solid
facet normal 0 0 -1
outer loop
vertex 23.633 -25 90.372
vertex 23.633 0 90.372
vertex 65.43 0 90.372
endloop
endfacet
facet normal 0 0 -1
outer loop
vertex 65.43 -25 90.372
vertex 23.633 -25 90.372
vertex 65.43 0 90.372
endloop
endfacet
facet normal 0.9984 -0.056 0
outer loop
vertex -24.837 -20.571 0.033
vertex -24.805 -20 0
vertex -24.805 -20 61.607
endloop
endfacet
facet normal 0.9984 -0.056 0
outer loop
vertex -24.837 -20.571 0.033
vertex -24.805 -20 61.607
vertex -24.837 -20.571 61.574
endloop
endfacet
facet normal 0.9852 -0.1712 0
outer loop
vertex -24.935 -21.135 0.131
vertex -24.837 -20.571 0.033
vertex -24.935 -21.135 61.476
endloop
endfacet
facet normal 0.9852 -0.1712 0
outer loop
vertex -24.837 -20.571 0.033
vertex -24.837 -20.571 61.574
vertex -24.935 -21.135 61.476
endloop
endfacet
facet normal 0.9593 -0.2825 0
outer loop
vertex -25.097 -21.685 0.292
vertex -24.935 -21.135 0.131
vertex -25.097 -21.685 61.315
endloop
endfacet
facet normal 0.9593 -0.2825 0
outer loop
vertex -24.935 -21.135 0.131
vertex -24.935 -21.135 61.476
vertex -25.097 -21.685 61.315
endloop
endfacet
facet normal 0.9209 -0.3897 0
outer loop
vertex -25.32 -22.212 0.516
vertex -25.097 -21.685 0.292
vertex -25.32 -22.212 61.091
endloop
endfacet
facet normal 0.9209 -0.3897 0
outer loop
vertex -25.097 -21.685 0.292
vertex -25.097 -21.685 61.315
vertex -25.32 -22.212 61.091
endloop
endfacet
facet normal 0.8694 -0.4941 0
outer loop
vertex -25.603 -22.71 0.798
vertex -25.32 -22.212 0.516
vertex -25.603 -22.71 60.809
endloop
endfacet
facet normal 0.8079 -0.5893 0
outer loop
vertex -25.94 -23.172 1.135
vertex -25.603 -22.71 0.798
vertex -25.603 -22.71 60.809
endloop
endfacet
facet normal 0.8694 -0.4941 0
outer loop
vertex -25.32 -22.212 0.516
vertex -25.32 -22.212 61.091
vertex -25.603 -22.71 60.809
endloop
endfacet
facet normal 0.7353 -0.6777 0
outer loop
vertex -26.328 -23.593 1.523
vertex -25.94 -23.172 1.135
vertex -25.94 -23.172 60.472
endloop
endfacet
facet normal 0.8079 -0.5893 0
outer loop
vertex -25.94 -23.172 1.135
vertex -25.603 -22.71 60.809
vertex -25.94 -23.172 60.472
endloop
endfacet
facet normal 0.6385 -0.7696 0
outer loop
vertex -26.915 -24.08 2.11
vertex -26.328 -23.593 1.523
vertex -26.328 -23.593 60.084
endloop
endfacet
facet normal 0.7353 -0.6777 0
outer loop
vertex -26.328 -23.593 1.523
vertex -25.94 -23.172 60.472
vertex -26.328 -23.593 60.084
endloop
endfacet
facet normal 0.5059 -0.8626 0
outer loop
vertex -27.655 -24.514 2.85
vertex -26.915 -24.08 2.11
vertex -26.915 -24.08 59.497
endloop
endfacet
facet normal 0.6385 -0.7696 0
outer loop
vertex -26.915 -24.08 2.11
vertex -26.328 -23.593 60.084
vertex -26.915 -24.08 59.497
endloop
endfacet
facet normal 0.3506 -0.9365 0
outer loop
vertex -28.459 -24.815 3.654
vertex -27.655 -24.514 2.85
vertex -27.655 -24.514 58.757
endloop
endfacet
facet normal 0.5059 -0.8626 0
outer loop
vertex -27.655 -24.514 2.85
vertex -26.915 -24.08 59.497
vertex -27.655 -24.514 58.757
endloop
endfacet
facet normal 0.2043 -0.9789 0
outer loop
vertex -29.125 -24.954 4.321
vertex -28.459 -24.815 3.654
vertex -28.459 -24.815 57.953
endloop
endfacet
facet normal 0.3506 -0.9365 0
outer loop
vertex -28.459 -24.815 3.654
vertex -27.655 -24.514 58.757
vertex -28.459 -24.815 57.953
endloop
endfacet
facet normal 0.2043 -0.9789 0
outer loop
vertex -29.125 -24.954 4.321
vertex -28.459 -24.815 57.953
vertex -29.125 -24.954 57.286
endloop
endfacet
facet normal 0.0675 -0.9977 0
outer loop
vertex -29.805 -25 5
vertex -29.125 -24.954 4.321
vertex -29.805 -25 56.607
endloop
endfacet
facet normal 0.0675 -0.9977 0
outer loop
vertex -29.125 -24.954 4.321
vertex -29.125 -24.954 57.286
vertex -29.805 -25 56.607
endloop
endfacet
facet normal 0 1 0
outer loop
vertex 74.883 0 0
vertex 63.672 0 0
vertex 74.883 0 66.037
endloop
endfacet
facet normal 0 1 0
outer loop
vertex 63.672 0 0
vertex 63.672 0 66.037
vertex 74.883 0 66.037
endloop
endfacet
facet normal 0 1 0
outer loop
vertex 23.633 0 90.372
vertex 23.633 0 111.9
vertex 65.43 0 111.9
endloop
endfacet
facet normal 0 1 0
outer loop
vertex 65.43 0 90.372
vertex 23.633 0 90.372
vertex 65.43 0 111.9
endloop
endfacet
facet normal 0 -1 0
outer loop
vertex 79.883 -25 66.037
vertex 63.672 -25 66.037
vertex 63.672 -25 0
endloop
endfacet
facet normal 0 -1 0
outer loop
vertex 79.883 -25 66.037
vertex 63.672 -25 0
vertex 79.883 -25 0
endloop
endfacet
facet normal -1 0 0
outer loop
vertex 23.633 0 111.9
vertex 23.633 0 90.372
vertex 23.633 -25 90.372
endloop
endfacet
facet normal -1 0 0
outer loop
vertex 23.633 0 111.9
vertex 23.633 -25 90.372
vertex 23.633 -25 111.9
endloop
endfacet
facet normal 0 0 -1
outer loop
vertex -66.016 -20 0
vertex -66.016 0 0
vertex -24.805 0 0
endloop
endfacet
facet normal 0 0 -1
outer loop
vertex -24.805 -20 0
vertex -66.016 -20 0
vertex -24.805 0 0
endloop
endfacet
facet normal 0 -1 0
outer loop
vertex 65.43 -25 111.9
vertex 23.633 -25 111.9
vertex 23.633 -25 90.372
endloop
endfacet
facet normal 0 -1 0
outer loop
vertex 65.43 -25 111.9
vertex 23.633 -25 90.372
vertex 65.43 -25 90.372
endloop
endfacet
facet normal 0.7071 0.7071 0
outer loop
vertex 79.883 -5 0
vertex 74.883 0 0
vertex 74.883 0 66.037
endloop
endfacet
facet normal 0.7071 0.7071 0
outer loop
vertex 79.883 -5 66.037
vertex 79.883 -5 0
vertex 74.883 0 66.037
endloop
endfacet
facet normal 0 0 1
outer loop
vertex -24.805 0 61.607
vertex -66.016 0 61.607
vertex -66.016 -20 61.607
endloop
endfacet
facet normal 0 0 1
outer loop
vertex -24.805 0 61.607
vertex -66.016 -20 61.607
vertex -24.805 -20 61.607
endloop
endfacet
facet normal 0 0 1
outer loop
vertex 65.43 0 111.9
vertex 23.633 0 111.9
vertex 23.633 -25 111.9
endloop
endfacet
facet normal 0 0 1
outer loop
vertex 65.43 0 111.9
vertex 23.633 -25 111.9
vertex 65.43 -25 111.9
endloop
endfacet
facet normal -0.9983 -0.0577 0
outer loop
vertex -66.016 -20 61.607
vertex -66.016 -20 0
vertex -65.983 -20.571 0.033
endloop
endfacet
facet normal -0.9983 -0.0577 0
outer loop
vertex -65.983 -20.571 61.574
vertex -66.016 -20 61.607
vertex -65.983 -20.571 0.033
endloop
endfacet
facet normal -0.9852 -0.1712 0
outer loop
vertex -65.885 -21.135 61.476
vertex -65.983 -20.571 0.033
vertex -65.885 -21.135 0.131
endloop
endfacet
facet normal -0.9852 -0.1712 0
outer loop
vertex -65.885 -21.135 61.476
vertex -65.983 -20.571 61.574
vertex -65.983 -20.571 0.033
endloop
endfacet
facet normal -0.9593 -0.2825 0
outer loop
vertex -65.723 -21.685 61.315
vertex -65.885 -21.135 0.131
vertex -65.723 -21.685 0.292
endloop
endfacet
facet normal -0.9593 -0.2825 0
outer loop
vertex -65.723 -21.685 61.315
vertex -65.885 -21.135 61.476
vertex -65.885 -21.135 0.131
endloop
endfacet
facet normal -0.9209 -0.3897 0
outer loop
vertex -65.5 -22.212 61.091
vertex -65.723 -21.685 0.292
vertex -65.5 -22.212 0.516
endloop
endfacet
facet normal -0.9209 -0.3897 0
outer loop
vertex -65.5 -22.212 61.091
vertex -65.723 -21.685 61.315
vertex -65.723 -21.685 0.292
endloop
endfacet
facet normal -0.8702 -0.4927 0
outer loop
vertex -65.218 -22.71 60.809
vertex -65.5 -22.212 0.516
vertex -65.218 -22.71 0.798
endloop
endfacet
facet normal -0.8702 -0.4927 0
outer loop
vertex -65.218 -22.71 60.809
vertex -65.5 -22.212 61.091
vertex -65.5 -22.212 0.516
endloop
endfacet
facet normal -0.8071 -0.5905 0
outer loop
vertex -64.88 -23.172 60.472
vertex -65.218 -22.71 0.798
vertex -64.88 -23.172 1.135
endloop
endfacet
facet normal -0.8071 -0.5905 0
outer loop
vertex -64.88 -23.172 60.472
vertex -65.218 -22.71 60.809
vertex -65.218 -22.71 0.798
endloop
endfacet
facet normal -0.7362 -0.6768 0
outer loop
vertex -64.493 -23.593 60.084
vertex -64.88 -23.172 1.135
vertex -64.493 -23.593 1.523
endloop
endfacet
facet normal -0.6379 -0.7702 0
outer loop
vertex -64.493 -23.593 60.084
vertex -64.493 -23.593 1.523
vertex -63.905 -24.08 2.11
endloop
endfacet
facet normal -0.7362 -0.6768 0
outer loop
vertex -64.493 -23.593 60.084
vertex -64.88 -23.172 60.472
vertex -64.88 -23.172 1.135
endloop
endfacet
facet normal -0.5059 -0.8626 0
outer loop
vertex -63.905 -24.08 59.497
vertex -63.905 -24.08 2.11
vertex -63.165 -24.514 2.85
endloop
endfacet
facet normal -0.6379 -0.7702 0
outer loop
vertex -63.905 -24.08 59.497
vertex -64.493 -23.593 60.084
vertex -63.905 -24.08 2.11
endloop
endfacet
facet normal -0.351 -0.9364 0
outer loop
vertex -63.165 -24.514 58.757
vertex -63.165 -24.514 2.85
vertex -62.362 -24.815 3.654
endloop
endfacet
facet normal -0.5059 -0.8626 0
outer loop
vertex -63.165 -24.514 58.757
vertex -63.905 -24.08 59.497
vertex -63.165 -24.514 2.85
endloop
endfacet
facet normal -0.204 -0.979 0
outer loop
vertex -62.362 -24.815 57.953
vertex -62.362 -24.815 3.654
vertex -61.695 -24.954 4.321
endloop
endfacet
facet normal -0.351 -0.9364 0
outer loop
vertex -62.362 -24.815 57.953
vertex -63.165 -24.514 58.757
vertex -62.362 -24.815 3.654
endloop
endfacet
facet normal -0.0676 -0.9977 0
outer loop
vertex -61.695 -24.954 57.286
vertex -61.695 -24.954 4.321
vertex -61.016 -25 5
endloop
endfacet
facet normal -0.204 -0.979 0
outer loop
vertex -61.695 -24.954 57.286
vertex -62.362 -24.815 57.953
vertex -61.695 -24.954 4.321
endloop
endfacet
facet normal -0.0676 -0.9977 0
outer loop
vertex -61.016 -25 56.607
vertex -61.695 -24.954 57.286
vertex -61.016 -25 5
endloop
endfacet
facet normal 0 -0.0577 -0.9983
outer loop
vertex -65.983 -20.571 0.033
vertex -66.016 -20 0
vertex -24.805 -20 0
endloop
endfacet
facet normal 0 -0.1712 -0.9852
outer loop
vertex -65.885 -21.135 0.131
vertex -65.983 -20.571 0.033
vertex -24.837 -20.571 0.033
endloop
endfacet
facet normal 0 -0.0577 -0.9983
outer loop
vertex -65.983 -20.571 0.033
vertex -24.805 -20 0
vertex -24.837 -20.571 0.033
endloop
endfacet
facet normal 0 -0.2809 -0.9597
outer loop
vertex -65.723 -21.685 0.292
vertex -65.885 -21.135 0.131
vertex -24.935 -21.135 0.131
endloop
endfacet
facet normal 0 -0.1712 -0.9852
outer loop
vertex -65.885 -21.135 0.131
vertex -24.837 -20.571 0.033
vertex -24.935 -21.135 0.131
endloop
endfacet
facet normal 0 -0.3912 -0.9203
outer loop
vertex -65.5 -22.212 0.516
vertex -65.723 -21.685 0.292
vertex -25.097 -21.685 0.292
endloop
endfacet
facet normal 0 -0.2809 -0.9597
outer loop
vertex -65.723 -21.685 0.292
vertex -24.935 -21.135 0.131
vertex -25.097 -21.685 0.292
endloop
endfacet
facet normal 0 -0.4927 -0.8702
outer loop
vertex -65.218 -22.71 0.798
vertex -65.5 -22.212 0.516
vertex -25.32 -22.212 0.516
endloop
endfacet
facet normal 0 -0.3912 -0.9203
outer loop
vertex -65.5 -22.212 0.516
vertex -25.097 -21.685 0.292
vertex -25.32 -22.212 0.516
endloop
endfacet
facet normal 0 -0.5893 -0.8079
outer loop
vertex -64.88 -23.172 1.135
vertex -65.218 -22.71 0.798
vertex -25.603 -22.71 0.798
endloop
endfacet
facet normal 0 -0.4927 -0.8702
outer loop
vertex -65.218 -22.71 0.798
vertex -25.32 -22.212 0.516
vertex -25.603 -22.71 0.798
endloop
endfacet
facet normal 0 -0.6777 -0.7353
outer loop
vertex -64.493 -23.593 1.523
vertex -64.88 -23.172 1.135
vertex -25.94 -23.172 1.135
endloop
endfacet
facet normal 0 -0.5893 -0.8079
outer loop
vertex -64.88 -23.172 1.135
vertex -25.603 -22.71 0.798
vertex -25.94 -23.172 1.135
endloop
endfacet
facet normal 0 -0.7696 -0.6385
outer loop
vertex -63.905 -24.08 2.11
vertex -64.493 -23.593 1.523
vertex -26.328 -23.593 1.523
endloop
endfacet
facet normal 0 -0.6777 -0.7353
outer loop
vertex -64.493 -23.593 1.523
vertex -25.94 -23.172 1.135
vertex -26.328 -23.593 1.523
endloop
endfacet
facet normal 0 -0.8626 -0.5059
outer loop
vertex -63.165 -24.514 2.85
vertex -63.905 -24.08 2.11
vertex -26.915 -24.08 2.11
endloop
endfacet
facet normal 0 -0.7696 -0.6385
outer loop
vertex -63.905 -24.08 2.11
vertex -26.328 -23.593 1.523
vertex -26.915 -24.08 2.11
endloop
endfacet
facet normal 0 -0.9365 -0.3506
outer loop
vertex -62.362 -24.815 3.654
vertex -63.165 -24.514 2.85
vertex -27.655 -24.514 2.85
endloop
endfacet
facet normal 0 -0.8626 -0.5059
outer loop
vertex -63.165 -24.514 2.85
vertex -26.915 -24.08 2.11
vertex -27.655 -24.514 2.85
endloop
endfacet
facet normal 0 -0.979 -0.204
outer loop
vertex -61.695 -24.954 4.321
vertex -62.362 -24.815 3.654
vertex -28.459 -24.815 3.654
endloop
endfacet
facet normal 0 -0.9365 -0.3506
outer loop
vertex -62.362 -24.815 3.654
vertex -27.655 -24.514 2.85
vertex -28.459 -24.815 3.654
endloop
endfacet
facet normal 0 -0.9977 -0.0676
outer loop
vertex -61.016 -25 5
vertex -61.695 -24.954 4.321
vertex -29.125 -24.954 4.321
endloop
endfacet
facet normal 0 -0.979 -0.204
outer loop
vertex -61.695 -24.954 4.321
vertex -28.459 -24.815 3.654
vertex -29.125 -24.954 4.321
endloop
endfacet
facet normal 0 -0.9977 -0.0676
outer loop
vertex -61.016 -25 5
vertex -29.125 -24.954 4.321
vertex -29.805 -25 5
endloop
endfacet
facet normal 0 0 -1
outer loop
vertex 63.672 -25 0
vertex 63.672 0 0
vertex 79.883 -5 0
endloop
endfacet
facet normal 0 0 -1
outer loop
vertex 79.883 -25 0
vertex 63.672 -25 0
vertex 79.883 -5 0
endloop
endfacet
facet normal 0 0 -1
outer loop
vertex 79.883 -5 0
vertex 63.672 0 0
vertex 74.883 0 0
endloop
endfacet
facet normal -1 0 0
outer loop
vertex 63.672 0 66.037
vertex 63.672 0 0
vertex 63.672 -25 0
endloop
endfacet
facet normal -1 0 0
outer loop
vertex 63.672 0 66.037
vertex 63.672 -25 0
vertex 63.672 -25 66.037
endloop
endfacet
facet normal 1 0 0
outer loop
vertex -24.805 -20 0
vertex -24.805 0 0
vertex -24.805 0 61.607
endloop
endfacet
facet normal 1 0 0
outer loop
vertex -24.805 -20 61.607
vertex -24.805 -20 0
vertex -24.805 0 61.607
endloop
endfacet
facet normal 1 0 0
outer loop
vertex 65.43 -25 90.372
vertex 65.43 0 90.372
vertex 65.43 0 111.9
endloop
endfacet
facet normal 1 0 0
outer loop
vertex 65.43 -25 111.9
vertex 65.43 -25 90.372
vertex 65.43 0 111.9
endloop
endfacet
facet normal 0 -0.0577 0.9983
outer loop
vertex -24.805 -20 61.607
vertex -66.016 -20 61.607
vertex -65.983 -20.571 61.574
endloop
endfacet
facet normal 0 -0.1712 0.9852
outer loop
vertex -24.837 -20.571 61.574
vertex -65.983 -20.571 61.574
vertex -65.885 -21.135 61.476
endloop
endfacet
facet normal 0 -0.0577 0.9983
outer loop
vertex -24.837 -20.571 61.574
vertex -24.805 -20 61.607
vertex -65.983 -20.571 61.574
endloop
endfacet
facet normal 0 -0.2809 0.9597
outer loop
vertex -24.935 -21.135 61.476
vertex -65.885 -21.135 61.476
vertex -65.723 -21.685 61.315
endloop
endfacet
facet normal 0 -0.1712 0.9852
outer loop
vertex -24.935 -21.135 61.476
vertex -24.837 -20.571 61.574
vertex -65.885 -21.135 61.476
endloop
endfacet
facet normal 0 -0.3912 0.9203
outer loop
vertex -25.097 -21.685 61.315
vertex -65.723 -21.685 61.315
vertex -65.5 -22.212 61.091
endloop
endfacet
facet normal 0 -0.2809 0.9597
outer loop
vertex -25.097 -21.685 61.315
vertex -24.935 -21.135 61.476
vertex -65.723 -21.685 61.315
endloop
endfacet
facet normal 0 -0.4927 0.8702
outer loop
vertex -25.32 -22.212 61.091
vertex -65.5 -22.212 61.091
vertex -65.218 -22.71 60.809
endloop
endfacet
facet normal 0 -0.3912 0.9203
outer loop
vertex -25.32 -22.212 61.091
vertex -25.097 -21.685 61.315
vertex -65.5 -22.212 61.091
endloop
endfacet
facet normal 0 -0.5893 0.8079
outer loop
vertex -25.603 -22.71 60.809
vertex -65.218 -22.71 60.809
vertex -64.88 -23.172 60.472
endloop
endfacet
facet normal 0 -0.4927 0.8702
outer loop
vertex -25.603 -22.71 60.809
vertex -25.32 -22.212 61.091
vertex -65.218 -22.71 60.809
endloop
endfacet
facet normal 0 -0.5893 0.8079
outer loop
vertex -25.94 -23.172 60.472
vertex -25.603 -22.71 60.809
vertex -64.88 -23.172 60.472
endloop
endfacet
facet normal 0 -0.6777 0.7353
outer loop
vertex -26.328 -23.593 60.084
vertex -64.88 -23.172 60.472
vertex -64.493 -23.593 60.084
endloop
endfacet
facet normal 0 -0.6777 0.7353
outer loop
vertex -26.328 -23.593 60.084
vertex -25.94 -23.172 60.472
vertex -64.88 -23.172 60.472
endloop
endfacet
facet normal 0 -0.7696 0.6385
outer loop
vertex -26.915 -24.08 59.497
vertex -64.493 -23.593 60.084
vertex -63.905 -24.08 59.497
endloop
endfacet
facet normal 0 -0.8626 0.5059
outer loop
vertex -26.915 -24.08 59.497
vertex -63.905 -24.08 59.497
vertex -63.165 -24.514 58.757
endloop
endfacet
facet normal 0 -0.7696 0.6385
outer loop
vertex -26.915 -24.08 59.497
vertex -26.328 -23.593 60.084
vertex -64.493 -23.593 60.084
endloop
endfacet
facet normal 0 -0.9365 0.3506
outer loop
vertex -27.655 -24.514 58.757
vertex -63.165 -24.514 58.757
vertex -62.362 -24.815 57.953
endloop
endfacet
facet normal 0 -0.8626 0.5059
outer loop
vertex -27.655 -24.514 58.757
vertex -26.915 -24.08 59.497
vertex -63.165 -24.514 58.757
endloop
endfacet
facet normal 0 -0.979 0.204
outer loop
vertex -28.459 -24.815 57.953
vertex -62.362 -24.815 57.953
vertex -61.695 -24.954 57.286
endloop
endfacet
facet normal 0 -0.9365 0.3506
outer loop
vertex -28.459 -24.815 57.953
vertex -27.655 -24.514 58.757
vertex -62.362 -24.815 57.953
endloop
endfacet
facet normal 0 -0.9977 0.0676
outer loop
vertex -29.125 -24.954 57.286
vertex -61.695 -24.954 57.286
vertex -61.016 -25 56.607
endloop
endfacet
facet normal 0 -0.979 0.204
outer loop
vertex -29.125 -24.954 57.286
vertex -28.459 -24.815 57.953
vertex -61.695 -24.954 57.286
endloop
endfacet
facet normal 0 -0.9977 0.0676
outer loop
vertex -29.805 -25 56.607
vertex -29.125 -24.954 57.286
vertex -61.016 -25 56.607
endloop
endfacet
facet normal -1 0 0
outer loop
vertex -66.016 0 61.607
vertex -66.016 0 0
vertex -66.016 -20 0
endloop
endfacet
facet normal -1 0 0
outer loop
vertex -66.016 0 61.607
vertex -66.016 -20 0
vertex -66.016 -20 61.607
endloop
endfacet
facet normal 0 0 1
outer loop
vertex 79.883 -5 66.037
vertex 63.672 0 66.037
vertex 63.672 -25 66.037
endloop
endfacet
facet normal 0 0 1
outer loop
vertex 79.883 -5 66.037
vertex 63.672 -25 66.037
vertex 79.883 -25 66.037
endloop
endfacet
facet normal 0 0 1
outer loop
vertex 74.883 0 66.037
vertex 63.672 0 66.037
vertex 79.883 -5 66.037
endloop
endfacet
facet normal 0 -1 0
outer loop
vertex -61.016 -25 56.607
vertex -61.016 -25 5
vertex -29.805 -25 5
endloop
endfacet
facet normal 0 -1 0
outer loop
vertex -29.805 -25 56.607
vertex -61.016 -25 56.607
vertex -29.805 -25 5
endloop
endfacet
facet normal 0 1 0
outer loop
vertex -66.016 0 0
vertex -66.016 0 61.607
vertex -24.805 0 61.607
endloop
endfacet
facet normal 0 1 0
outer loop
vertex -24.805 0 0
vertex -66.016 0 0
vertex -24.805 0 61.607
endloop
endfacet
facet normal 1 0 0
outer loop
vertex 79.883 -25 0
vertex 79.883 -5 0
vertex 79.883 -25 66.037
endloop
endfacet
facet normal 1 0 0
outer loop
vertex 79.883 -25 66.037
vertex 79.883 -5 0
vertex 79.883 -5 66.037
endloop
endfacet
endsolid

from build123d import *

# Parameters (mm, degrees)
F0_W     = 41.210938
F0_H     = 61.607003
F1_DEPTH = 25
F0_W_2   = 16.210914
F0_H_2   = 66.036731
F2_DEPTH = 25
F0_W_3   = 41.796878
F0_H_3   = 21.52805
F3_DEPTH = 25
F4_R     = 5
F5_SIZE  = 5


with BuildPart() as f1:
    # F0 (on Front) → F1 (new body)
    with BuildSketch(Plane.XZ):
        with Locations((-45.410169, 30.803501)):
            Rectangle(F0_W, F0_H)
    extrude(amount=F1_DEPTH)

    # F4
    f4_edges = [f1.edges().sort_by_distance(p)[0] for p in [
        (-45.410169, -25, 61.607003),
        (-66.015638, -25, 30.803502),
        (-45.410169, -25, 0),
        (-24.8047, -25, 30.803502),
    ]]
    fillet(f4_edges, radius=F4_R)


with BuildPart() as f2:
    # F0 (on Front) → F2 (new body)
    with BuildSketch(Plane.XZ):
        with Locations((71.777329, 33.018366)):
            Rectangle(F0_W_2, F0_H_2)
    extrude(amount=F2_DEPTH)

    # F5
    f5_edges = [f2.edges().sort_by_distance(p)[0] for p in [
        (79.882786, 0, 33.018366),
    ]]
    chamfer(f5_edges, length=F5_SIZE)


with BuildPart() as f3:
    # F0 (on Front) → F3 (new body)
    with BuildSketch(Plane.XZ):
        with Locations((44.531241, 101.136319)):
            Rectangle(F0_W_3, F0_H_3)
    extrude(amount=F3_DEPTH)


solid = Compound([f1.part, f2.part, f3.part])
